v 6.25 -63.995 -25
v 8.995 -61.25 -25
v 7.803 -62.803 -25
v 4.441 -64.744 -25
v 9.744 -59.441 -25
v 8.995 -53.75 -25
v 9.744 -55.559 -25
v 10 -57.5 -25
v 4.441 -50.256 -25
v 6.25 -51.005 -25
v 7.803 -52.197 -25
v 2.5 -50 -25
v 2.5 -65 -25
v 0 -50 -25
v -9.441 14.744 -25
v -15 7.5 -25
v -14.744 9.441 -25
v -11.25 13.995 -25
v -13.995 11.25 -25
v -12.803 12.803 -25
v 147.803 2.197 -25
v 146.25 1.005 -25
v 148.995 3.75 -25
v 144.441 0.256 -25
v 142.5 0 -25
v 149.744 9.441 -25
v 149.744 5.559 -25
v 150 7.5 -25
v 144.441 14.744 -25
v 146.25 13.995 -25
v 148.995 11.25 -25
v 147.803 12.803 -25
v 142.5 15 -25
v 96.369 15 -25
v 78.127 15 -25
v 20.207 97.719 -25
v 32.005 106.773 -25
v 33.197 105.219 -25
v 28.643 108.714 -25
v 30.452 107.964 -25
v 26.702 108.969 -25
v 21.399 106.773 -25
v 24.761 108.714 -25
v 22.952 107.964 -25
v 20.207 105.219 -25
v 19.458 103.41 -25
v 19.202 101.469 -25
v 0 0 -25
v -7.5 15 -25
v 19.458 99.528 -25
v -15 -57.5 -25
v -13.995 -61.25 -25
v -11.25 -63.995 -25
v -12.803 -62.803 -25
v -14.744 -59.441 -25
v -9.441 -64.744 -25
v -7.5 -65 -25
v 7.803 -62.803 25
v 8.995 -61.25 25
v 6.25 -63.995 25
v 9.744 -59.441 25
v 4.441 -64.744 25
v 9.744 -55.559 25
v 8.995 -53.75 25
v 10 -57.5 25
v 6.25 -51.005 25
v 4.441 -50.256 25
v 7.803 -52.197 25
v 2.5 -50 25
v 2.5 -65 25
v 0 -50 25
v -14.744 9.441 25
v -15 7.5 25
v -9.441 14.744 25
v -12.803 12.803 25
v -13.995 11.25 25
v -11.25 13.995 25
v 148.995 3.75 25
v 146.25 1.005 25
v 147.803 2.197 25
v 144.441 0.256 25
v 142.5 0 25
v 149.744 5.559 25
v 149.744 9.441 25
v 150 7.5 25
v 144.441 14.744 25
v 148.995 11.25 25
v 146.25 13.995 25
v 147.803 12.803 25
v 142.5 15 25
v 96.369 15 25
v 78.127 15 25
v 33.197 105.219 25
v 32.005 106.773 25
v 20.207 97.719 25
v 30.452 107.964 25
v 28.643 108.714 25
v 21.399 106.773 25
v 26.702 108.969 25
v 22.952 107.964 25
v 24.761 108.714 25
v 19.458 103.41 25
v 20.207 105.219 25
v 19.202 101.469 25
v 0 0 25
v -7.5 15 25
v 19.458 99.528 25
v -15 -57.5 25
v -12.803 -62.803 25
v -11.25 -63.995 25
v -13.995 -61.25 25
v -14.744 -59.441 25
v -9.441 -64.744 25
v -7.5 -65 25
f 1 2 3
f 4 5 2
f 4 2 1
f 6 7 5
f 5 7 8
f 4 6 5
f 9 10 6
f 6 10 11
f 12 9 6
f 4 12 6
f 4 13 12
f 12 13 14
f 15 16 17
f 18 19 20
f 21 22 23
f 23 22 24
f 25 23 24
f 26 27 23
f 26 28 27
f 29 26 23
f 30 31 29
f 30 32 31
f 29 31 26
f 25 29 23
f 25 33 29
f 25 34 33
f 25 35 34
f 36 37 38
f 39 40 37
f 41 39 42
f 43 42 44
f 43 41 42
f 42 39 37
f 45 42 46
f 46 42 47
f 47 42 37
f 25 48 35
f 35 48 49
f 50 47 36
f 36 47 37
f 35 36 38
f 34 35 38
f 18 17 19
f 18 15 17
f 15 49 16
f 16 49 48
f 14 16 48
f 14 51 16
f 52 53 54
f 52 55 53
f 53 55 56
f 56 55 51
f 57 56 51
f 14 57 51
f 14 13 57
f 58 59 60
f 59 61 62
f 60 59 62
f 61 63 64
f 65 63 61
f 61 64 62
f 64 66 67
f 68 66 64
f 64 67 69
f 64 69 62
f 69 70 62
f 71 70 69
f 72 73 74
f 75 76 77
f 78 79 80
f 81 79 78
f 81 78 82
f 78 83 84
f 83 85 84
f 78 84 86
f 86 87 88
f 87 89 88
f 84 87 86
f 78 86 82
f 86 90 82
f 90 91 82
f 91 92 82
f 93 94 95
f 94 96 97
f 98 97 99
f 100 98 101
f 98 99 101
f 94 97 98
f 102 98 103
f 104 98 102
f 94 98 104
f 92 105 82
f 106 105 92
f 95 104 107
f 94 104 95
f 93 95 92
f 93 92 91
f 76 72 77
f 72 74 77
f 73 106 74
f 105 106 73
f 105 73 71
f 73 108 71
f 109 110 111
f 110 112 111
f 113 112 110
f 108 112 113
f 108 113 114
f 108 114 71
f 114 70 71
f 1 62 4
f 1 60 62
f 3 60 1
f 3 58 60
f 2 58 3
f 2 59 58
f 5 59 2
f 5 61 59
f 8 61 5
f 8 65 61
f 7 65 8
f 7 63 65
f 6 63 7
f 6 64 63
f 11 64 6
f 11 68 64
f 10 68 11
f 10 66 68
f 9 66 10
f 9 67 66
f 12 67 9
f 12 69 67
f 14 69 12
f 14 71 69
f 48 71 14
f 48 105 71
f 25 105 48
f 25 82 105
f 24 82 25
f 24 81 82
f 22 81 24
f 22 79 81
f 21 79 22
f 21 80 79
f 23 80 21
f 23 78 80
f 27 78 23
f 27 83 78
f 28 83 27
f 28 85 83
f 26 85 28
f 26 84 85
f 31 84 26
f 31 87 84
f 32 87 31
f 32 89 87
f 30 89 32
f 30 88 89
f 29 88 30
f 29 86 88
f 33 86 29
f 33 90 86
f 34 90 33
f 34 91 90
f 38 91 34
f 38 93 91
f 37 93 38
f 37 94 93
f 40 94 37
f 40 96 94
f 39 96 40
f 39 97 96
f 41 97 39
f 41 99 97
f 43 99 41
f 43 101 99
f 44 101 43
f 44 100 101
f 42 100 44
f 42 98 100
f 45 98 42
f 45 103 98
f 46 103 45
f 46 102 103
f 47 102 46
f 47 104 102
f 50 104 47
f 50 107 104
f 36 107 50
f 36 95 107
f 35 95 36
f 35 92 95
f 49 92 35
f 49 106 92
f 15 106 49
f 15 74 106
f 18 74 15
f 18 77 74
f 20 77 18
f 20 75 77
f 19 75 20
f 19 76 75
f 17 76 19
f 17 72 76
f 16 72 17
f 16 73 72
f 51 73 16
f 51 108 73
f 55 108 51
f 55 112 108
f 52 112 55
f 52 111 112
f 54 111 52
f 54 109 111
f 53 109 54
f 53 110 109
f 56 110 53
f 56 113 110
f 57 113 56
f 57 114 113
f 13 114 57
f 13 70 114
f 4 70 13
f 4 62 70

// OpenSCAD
//CUSTOMIZER VARIABLES

// The width of the stand when looking from the front
stand_width = 50;

// The depth of the spot in which the stood object sits
bottom_depth = 50;

// The height of the stand measured up the backrest
backrest_height = 150;

// The angle that the stood object leans back
lean_angle = 20;

// The distance between the points of contact when the stand is leaned back
base_distance = 100;

// The height at which the stand part intersects with the backrest
join_height = 100;

// The height of the lip
lip_height = 10;

// The thickness of all parts of the stand
structure_thickness = 15;

//CUSTOMIZER VARIABLES END

module stand(width=stand_width, depth=bottom_depth, height=backrest_height, angle=lean_angle, base=base_distance, join=join_height, lip=lip_height, thickness=structure_thickness) {
    linear_extrude(height = width, center = true)
    union() {
        // Backrest
        hull() {
            translate([height-(thickness/2),(thickness/2),0]) circle(d=thickness);
            translate([-(thickness/2),(thickness/2),0]) circle(d=thickness);
        }
        // Stand
        hull() {
            translate([join-(thickness/2),(thickness/2),0]) circle(d=thickness);
            translate([sin(angle) * base - (thickness/2),cos(angle) * base + (thickness/2),0]) circle(d=thickness);
        }
        // Holder
        hull() {
            translate([-(thickness/2),-depth-(thickness/2),0]) circle(d=thickness);
            translate([-(thickness/2),(thickness/2),0])circle(d=thickness);
        }
        // Lip
        hull() {
            translate([-(thickness/2),-depth-(thickness/2),0]) circle(d=thickness);
            translate([lip -(thickness/2),-depth-(thickness/2),0]) circle(d=thickness);
        }
    }
}

stand();
